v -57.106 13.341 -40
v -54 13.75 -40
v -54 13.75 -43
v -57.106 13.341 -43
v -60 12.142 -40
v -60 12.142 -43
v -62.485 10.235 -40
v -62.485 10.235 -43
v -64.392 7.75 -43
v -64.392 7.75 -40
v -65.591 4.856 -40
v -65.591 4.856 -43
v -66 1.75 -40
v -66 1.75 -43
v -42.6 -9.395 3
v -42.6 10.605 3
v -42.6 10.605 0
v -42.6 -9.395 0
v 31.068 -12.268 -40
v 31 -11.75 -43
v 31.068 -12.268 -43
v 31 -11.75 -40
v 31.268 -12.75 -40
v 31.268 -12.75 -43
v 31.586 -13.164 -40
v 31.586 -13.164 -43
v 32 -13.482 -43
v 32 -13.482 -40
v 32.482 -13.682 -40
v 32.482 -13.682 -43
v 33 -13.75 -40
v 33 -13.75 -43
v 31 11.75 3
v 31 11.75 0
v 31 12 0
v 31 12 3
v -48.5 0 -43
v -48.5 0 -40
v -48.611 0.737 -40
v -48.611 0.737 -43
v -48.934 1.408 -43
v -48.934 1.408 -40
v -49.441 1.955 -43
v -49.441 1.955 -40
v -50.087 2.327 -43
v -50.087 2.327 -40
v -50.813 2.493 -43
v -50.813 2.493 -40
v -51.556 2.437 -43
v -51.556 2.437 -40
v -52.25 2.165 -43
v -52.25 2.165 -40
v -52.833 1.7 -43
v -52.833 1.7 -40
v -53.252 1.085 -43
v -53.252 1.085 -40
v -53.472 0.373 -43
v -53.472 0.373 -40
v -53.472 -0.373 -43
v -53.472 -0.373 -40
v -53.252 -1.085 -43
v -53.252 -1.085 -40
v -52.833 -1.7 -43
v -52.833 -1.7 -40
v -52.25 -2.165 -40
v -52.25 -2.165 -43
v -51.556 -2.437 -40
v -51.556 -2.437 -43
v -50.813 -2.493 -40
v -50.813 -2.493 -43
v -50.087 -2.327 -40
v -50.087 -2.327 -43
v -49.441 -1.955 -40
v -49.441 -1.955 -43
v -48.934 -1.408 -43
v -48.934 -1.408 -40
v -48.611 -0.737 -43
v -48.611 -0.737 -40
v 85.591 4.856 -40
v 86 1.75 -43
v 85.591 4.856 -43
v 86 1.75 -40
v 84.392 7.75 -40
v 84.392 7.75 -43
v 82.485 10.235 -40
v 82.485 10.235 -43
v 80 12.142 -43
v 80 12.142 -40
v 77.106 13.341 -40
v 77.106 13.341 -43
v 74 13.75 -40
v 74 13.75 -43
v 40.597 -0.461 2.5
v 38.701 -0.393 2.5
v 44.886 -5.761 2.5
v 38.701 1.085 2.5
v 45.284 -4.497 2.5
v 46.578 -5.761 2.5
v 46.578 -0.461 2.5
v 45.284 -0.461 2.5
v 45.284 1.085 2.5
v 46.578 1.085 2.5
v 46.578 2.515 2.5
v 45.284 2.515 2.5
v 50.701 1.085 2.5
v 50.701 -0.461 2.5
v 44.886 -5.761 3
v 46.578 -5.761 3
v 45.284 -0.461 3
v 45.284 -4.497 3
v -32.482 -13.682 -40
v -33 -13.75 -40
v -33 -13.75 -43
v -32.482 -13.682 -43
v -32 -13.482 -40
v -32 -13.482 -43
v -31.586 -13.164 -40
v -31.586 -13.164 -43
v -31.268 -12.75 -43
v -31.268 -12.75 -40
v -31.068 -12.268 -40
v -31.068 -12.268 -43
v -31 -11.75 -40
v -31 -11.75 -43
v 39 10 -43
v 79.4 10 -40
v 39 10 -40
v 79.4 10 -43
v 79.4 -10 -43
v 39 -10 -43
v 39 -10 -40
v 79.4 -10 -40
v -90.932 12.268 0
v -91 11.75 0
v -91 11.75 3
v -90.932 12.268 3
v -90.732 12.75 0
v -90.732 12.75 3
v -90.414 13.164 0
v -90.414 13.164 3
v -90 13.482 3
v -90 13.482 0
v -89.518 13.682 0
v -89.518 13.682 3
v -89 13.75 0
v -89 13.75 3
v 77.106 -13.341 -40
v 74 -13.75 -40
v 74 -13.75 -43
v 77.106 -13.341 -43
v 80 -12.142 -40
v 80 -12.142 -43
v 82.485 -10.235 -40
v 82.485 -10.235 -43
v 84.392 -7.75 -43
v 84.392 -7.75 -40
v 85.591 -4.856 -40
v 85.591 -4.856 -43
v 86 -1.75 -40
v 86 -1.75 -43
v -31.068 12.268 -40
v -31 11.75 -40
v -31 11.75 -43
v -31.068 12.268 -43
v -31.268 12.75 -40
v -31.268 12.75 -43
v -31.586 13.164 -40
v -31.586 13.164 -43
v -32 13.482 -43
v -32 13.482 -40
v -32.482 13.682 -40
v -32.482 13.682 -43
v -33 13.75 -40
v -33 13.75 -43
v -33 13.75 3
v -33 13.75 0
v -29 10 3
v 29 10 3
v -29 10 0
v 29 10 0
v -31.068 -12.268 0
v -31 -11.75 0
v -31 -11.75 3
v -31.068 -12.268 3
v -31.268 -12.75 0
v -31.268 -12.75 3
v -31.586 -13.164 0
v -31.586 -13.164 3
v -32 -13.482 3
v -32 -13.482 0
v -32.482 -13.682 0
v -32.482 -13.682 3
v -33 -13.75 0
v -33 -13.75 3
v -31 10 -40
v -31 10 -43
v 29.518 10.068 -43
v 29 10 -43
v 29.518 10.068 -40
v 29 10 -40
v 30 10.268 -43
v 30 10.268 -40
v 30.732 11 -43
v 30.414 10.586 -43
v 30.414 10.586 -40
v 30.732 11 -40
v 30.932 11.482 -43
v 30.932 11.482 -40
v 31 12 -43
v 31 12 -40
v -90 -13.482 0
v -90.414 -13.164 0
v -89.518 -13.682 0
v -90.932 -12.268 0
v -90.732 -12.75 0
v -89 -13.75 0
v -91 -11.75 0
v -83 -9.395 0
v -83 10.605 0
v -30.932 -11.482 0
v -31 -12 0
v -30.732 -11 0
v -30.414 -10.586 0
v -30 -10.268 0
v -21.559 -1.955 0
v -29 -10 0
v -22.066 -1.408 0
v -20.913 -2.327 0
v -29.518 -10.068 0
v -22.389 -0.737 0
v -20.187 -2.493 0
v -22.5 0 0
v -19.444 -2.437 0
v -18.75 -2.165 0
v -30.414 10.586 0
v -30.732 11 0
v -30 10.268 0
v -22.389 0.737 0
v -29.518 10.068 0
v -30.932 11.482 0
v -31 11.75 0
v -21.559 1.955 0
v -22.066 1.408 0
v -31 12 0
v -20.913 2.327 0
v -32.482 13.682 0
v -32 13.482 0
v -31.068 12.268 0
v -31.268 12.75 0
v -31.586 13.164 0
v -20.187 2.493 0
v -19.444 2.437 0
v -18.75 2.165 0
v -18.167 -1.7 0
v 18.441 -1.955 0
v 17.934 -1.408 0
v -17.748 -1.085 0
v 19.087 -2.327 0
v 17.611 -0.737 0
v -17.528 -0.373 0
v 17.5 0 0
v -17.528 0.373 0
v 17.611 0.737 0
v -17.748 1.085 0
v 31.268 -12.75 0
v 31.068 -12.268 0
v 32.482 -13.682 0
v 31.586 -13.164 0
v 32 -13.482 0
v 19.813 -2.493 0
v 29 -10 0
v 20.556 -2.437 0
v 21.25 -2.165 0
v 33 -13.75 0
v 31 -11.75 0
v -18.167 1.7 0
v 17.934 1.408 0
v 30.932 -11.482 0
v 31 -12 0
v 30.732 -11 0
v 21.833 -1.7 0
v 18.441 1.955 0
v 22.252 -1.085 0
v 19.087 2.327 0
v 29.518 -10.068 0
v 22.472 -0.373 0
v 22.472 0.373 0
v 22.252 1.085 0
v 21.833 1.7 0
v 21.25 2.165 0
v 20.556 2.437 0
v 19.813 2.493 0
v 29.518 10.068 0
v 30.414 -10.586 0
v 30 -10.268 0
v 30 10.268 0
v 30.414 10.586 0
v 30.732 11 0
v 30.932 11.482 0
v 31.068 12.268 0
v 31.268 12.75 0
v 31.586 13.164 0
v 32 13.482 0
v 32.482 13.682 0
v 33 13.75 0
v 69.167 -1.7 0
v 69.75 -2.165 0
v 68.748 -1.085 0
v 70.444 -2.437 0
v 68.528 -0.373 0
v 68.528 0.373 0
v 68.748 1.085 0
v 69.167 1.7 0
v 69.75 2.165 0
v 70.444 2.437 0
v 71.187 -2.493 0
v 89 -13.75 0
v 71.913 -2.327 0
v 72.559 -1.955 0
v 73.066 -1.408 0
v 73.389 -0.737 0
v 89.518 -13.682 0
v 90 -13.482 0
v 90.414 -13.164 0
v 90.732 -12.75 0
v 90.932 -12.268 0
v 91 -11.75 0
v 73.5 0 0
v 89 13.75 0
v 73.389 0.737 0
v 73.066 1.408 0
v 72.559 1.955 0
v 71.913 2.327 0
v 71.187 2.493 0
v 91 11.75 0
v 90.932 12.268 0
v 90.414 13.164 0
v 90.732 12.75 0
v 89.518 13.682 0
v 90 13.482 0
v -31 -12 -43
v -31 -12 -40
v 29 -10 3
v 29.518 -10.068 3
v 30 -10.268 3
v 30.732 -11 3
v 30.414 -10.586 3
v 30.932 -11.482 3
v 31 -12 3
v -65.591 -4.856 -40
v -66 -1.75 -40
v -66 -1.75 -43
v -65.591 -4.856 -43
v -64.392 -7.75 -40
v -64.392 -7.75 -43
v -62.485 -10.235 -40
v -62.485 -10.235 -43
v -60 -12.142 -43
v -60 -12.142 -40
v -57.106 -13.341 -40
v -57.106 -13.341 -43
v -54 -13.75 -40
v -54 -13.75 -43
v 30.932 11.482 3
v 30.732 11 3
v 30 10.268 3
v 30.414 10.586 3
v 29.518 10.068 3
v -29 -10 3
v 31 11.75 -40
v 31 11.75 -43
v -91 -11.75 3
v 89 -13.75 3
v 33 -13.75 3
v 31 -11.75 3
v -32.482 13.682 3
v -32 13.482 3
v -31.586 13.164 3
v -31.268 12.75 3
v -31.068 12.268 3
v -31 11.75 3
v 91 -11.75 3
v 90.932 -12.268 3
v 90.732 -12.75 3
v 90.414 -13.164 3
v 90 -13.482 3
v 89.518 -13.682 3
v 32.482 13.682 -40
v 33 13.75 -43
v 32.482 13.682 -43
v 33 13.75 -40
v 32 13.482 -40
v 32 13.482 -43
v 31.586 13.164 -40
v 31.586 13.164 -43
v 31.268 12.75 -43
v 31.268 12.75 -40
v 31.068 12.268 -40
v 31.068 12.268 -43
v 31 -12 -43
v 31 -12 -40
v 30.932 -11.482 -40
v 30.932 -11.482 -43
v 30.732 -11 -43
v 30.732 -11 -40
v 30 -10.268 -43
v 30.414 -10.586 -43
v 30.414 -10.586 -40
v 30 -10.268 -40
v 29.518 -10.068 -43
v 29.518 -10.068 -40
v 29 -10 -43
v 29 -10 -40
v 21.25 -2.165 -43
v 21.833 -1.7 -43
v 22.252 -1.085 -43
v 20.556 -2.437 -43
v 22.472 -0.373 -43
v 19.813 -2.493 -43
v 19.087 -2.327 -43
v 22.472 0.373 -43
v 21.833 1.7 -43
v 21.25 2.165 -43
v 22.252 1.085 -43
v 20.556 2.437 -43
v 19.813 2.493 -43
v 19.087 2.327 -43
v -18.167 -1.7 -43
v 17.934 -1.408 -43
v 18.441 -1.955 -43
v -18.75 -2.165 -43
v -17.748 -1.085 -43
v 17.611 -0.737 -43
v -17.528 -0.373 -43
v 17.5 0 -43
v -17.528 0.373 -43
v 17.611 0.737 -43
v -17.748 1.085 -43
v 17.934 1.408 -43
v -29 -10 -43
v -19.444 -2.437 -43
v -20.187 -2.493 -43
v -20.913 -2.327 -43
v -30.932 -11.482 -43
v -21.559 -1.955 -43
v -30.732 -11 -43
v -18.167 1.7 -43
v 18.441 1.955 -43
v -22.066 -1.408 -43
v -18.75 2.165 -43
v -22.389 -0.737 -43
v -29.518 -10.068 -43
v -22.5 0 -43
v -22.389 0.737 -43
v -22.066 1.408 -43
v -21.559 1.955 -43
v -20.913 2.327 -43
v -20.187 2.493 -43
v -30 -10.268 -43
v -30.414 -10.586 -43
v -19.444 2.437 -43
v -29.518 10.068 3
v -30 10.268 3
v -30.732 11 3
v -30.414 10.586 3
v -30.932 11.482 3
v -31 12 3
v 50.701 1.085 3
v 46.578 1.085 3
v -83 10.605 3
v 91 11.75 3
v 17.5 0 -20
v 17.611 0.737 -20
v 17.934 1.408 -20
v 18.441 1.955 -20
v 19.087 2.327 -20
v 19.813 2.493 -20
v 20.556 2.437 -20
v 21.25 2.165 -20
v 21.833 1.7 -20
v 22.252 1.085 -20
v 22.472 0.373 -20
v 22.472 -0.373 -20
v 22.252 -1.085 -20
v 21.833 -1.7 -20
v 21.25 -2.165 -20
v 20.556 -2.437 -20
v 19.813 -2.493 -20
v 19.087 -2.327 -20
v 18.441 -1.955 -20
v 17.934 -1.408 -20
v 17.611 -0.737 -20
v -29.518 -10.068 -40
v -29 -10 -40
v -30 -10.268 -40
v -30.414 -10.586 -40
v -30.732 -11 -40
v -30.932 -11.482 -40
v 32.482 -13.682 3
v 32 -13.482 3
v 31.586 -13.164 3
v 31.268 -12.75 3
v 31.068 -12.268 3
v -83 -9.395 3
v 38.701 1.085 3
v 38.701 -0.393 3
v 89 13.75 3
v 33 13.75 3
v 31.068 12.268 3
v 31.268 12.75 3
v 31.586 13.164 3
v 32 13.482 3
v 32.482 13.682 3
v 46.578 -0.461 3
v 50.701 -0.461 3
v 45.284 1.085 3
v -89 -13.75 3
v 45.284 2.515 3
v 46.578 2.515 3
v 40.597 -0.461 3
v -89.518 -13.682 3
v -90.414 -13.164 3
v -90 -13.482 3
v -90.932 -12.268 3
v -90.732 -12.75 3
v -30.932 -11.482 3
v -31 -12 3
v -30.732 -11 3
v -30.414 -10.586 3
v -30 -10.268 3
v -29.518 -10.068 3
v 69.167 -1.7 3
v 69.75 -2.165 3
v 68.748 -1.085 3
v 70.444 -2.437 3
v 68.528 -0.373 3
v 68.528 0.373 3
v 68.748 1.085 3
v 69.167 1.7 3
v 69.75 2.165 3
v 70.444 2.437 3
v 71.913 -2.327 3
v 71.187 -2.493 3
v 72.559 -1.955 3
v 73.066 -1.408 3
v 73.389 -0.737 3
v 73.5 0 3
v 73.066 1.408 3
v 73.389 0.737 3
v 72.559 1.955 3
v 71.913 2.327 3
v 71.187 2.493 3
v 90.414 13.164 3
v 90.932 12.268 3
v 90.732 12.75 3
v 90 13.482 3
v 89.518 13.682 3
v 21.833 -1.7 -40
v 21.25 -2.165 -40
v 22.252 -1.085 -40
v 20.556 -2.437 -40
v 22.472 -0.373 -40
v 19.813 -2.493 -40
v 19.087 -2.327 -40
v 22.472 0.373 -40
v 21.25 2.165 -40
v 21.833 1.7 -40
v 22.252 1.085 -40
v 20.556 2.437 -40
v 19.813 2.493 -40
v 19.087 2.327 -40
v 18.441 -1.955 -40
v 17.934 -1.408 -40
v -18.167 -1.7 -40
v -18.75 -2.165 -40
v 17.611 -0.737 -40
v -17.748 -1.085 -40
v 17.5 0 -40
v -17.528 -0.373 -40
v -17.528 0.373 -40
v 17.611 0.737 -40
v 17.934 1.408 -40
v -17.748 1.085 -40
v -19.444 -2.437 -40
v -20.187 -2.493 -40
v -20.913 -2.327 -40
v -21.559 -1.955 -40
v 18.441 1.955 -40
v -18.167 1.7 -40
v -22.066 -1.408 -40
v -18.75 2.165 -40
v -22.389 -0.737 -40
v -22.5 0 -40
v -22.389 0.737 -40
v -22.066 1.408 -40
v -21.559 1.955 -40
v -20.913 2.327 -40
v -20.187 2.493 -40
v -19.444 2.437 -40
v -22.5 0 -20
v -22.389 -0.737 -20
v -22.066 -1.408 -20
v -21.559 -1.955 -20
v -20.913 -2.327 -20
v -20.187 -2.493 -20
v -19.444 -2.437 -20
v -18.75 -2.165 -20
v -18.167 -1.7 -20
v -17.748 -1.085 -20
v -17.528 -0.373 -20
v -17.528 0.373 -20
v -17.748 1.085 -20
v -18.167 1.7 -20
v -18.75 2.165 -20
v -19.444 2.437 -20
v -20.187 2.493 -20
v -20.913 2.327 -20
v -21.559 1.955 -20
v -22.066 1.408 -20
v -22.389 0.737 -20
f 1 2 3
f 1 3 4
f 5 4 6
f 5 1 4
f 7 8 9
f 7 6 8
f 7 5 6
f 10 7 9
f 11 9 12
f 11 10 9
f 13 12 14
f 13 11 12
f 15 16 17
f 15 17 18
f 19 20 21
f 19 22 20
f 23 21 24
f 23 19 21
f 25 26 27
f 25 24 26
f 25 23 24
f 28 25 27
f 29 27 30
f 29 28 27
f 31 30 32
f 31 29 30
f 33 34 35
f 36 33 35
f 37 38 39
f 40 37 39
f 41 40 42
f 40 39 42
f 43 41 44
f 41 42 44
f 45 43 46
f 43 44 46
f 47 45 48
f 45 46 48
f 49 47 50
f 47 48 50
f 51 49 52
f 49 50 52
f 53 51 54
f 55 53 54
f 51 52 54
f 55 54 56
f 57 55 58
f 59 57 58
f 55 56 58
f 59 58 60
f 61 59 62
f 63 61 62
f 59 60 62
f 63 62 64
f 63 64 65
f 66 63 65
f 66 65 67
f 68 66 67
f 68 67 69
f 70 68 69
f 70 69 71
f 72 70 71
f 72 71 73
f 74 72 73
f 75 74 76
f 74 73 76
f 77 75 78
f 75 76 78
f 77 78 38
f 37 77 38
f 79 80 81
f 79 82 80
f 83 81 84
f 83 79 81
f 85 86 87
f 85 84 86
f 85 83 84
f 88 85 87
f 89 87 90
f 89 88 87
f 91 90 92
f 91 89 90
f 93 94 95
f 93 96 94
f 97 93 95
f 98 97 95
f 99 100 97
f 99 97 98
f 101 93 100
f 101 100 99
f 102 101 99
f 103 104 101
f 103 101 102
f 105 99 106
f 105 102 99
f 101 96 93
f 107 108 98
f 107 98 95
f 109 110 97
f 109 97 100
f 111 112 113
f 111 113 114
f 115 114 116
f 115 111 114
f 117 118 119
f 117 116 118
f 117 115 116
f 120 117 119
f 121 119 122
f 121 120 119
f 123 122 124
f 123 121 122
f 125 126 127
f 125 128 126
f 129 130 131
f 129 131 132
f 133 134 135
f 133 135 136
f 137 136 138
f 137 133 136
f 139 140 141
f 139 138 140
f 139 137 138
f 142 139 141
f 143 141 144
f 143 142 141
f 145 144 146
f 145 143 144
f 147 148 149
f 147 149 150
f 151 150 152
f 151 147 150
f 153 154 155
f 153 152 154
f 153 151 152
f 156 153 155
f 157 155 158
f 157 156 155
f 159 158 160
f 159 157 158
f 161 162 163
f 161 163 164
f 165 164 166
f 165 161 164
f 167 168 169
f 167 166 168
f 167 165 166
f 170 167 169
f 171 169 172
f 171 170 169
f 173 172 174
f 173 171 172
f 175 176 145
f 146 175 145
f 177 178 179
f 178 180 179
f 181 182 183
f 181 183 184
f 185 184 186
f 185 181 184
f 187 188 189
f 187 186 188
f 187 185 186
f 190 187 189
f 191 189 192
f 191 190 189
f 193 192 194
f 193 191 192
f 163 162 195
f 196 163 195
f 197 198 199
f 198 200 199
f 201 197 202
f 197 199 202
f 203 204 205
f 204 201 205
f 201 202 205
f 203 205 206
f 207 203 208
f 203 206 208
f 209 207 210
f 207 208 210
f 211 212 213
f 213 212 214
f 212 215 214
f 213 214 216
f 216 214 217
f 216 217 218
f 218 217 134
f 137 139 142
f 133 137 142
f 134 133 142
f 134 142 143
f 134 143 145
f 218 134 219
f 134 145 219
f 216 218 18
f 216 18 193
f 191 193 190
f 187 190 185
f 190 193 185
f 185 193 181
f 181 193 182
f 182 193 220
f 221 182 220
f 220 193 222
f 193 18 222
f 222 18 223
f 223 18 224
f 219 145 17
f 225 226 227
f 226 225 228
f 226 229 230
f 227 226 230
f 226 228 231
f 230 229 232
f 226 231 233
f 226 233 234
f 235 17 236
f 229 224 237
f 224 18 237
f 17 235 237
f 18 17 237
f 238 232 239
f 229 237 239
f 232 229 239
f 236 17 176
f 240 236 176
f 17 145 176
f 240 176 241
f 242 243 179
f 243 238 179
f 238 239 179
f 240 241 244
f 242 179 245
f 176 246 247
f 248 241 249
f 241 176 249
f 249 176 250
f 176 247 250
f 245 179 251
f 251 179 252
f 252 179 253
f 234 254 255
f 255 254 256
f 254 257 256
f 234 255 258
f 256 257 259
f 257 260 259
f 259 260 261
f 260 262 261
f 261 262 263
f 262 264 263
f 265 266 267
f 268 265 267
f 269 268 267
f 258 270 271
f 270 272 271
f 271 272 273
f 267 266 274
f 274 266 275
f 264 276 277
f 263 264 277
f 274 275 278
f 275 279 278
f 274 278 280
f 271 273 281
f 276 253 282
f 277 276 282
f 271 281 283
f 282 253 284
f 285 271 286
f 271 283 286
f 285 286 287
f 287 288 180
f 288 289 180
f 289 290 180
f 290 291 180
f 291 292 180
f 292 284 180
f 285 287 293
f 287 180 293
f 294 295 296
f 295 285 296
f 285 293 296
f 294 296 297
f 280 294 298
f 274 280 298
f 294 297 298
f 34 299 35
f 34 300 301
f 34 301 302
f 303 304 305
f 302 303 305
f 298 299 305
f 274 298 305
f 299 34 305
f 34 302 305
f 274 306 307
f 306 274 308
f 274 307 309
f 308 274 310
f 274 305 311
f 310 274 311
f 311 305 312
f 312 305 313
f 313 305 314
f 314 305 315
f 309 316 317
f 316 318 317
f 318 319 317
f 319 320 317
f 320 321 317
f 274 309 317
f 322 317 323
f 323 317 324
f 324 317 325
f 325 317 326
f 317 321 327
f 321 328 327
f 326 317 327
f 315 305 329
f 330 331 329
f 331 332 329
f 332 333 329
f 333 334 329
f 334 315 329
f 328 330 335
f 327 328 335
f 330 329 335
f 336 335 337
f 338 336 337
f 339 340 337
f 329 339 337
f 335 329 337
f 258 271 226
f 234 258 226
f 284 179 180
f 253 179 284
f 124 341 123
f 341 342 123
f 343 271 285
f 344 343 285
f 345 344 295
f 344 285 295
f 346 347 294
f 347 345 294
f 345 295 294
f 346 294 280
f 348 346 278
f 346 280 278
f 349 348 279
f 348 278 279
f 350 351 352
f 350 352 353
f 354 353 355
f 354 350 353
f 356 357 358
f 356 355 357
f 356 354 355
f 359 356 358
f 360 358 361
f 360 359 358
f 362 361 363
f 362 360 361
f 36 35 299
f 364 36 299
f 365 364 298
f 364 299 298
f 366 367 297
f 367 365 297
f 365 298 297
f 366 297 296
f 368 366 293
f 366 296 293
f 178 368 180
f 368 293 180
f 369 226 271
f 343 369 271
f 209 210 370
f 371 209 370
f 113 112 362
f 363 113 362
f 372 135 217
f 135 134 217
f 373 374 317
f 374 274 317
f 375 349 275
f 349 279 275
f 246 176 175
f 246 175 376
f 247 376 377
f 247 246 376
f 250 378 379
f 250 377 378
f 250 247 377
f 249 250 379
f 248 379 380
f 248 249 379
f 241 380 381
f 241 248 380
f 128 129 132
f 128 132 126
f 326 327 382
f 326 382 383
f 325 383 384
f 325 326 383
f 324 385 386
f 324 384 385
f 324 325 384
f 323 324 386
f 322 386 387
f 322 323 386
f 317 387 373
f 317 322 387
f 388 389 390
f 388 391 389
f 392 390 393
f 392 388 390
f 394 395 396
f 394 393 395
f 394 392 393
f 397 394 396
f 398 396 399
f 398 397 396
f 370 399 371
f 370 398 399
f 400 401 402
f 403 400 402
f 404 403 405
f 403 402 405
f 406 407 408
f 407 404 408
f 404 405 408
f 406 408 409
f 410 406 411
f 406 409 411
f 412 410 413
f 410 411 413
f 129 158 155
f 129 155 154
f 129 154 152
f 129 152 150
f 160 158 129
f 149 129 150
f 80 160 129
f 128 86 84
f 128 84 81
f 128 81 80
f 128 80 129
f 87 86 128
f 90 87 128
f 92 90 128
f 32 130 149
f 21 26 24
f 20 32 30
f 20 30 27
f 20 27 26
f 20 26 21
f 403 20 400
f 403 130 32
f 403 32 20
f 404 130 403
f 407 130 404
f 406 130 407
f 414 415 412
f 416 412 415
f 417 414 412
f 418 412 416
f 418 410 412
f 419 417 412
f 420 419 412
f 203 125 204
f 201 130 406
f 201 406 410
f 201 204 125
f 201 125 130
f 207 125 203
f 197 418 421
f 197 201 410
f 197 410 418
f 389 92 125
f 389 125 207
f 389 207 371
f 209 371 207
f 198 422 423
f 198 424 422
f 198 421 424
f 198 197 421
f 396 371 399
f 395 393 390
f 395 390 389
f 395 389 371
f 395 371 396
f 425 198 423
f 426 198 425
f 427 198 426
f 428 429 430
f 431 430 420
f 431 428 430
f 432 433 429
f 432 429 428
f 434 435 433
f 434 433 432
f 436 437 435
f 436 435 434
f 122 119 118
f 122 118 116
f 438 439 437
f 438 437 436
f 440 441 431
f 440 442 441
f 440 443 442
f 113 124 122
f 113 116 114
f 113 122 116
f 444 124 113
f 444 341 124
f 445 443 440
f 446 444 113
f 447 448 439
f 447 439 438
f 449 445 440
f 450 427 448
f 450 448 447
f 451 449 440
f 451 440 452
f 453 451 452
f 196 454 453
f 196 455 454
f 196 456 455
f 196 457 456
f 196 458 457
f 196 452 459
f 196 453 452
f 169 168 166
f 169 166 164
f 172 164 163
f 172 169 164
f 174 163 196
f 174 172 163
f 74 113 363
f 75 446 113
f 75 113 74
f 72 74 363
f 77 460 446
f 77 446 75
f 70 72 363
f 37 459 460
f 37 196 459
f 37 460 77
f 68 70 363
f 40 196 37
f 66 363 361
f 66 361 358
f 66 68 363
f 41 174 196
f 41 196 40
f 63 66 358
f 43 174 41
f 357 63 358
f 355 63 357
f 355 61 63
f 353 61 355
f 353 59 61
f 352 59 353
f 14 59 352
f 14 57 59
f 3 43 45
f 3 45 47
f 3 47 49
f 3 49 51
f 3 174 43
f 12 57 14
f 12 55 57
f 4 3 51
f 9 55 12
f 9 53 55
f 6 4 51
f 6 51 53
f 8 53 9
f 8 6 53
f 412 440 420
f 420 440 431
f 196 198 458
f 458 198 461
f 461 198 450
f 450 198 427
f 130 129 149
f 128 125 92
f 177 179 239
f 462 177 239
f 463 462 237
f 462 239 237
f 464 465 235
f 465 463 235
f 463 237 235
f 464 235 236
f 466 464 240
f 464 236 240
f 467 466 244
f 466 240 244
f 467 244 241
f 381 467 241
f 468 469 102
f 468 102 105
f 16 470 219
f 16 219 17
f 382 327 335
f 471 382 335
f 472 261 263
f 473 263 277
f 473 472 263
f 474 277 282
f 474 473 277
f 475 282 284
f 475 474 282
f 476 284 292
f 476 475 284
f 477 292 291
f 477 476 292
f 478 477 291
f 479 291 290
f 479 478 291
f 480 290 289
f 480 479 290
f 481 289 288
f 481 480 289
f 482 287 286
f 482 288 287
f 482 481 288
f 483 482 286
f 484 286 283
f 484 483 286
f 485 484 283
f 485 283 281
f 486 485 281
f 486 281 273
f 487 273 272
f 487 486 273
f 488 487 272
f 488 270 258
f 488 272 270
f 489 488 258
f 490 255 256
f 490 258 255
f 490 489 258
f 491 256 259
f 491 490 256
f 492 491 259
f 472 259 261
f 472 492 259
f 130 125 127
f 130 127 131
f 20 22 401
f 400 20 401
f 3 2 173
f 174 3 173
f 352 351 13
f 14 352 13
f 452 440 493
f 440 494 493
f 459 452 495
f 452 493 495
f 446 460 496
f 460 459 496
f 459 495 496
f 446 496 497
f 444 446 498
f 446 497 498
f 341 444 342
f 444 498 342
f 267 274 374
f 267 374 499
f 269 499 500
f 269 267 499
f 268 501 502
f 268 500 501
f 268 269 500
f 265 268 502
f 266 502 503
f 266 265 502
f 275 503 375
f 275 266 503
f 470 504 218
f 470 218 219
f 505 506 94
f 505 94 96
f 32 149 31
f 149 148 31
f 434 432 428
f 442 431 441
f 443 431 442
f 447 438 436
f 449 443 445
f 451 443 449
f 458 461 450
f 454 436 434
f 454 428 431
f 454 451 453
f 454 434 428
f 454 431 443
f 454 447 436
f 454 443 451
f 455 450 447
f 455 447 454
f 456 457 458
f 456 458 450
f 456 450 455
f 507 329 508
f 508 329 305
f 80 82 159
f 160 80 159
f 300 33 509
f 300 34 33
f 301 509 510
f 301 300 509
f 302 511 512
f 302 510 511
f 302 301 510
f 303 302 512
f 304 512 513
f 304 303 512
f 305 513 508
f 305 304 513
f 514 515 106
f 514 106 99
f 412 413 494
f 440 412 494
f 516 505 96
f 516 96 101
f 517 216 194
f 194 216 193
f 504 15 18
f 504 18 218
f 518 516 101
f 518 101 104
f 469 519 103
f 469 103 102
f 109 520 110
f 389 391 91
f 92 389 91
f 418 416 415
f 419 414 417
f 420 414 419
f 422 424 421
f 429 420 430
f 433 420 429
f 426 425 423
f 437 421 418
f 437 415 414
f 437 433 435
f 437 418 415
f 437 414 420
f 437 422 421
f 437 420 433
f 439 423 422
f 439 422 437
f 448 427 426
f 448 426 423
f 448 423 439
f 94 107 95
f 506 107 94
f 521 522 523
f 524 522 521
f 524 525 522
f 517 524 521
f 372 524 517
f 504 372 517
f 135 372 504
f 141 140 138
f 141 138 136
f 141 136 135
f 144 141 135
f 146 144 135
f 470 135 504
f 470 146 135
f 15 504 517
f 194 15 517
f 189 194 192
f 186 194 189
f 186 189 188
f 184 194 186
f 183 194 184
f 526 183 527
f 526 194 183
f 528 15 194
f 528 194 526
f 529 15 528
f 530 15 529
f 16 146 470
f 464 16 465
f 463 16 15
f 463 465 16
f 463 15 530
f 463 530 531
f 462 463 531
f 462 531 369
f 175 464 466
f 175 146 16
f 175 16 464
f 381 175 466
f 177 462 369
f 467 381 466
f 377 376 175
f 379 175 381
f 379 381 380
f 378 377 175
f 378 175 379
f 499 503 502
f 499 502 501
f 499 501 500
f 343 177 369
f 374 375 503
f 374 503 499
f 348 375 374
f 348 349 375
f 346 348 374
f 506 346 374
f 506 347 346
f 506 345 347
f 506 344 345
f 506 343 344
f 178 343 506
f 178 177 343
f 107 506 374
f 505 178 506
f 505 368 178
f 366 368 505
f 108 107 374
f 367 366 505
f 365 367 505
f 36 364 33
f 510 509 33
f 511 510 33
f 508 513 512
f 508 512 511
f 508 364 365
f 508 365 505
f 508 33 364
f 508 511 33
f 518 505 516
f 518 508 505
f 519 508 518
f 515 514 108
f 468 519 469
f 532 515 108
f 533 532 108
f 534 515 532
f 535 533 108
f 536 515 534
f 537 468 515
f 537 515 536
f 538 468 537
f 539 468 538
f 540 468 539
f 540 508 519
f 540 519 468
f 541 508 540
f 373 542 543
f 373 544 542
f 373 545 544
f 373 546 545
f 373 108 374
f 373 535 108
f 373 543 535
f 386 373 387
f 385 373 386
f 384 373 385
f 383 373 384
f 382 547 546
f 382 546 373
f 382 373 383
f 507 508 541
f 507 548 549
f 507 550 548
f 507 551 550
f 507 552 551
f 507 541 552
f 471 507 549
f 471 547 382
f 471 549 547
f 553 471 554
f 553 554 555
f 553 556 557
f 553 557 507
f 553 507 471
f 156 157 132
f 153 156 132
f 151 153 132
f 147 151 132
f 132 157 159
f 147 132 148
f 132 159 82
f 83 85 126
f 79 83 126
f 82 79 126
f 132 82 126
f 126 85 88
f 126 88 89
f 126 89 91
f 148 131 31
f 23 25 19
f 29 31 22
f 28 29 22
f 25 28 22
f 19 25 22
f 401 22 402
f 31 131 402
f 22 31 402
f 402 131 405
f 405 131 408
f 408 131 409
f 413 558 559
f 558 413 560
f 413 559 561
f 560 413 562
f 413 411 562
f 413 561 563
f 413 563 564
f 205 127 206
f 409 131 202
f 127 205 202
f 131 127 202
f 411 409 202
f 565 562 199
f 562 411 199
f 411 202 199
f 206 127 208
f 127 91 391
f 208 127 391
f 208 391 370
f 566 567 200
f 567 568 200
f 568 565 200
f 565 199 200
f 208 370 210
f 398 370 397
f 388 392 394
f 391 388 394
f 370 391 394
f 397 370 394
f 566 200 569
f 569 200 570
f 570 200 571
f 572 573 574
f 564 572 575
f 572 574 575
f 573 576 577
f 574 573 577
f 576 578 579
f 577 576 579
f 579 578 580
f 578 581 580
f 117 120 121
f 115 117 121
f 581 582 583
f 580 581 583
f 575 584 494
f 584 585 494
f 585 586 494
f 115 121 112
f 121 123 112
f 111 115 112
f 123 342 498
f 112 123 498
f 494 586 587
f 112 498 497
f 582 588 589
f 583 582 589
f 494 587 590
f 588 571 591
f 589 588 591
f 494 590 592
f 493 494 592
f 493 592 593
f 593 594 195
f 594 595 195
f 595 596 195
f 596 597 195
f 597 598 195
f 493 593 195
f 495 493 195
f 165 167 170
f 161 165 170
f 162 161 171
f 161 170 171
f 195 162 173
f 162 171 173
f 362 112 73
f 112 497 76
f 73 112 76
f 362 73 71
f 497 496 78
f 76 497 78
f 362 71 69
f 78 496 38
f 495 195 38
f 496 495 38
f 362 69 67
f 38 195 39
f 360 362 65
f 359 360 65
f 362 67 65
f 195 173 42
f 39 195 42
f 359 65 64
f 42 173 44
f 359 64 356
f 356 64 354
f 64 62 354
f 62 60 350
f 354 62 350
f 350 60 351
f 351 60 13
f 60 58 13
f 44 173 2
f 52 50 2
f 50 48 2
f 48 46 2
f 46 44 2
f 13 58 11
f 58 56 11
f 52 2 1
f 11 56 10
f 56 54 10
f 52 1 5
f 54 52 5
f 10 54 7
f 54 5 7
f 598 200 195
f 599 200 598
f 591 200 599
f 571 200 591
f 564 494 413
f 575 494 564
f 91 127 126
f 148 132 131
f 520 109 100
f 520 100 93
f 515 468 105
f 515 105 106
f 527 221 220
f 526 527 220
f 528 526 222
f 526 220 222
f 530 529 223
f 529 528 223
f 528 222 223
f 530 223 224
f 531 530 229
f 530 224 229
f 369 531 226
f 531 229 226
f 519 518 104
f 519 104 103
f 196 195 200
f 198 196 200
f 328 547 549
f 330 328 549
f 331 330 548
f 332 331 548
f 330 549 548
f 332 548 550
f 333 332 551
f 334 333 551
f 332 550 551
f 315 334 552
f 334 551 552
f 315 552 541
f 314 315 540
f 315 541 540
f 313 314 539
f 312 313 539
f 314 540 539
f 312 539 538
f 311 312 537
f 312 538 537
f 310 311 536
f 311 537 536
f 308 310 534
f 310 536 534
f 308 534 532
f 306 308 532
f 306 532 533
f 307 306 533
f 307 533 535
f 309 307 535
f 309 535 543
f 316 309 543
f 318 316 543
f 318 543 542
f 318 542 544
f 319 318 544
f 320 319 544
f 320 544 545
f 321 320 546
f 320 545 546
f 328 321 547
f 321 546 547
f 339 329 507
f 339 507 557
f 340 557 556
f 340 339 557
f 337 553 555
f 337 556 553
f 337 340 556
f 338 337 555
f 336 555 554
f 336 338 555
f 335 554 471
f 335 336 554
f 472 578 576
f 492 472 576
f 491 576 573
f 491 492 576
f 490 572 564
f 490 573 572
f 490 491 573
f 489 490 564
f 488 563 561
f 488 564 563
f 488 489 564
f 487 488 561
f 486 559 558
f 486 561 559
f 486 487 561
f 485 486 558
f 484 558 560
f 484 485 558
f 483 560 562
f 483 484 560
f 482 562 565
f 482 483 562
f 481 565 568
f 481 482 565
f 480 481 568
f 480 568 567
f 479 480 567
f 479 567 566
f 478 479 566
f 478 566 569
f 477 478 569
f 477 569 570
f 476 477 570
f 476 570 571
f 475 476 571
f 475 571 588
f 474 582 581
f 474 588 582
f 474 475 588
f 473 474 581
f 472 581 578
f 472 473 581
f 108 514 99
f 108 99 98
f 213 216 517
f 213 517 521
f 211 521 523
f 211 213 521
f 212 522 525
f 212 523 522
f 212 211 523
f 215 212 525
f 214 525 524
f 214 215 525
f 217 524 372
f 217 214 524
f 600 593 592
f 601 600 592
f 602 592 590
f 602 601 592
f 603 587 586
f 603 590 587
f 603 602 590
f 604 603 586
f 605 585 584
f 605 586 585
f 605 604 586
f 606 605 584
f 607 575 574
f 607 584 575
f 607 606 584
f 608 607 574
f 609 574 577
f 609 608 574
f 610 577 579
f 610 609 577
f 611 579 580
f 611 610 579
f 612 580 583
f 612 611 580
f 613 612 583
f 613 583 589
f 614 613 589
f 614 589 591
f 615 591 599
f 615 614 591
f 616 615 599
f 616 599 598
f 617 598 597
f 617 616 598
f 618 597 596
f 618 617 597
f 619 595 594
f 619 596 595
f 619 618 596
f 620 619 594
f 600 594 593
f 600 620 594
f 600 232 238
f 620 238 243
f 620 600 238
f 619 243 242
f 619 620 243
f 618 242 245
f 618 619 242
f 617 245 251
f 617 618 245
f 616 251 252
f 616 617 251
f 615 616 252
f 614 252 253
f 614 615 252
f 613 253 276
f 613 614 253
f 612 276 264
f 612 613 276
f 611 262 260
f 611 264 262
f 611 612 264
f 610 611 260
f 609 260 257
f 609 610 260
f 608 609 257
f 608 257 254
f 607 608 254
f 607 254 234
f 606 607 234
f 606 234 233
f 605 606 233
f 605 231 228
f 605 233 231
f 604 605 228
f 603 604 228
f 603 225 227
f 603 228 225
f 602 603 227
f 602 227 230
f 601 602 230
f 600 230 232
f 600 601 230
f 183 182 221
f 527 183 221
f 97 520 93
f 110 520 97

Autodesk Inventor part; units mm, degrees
ref_plane "YZ Plane" through (0, 0, 0) normal (1, 0, 0) x (0, 1, 0)
sketch "Boceto1" plane through (0, 0, 0) normal (0, 0, 1) x (1, 0, 0)
  line L0 (-91, 11.75) -> (-91, -11.75)
  line L1 (-89, -13.75) -> (-33, -13.75)
  line L2 (-31, -11.75) -> (-31, -12)
  line L3 (-29, -10) -> (29, -10)
  line L4 (31, -12) -> (31, -11.75)
  line L5 (33, -13.75) -> (89, -13.75)
  line L6 (91, -11.75) -> (91, 11.75)
  line L7 (89, 13.75) -> (33, 13.75)
  line L8 (31, 11.75) -> (31, 12)
  line L9 (29, 10) -> (-29, 10)
  line L10 (-31, 12) -> (-31, 11.75)
  line L11 (-33, 13.75) -> (-89, 13.75)
  line L12 (0, 0) -> (0, 52.9432) construction
  line L13 (0, 0) -> (-66, 0) construction
  arc A0 (-89, 13.75) -> (-91, 11.75) centre (-89, 11.75) ccw
  arc A1 (-91, -11.75) -> (-89, -13.75) centre (-89, -11.75) ccw
  arc A2 (-33, -13.75) -> (-31, -11.75) centre (-33, -11.75) ccw
  arc A3 (-29, -10) -> (-31, -12) centre (-29, -12) ccw
  arc A4 (-31, 12) -> (-29, 10) centre (-29, 12) ccw
  arc A5 (-31, 11.75) -> (-33, 13.75) centre (-33, 11.75) ccw
  arc A6 (29, 10) -> (31, 12) centre (29, 12) ccw
  arc A7 (33, 13.75) -> (31, 11.75) centre (33, 11.75) ccw
  arc A8 (31, -12) -> (29, -10) centre (29, -12) ccw
  arc A9 (31, -11.75) -> (33, -13.75) centre (33, -11.75) ccw
  arc A10 (89, -13.75) -> (91, -11.75) centre (89, -11.75) ccw
  arc A11 (91, 11.75) -> (89, 13.75) centre (89, 11.75) ccw
  point P0 (-91, 13.75)
  point P1 (-91, -13.75)
  point P2 (-31, -13.75)
  point P3 (91, -13.75)
  point P4 (91, 13.75)
  point P5 (31, 13.75)
  point P6 (31, 10)
  point P7 (-31, 10)
  point P8 (-31, 13.75)
  dimension "d0" = 182
  dimension "d1" = 60
  dimension "d3" = 27.5
  dimension "d4" = 20
  dimension "d5" = 2
  dimension "d6" = 27.5
  dimension "d7" = 2
extrude "Extrusión1" add sketch "Boceto1" along normal blind 3
sketch "Boceto2" plane through (0, 0, 3) normal (0, 0, 1) x (1, 0, 0)
  circle A0 centre (-20, 0) radius 2.5
  circle A1 centre (20, 0) radius 2.5
  line L0 (0, 0) -> (0, 32) construction
  dimension "d10" = 5
  dimension "d11" = 5
  dimension "d12" = 40
extrude "Extrusión2" cut sketch "Boceto2" against normal blind 3
ref_plane "Plano de trabajo1" through (0, 0, -40) normal (0, 0, -1) x (-1, 0, 0)
sketch "Boceto3" plane through (0, 0, -40) normal (0, 0, -1) x (-1, 0, 0)
  line L0 (-86, 1.75) -> (-86, -1.75)
  line L1 (-74, -13.75) -> (-33, -13.75)
  line L2 (-31, -11.75) -> (-31, -12)
  line L3 (-29, -10) -> (29, -10)
  line L4 (31, -12) -> (31, -11.75)
  line L5 (33, -13.75) -> (54, -13.75)
  line L6 (66, -1.75) -> (66, 1.75)
  line L7 (54, 13.75) -> (33, 13.75)
  line L8 (31, 11.75) -> (31, 10)
  line L9 (31, 10) -> (-29, 10)
  line L10 (-31, 12) -> (-31, 11.75)
  line L11 (-33, 13.75) -> (-74, 13.75)
  line L12 (0, 0) -> (0, 26) construction
  line L13 (0, 0) -> (49, 0) construction
  arc A0 (-74, 13.75) -> (-86, 1.75) centre (-74, 1.75) ccw
  arc A1 (-86, -1.75) -> (-74, -13.75) centre (-74, -1.75) ccw
  arc A2 (66, 1.75) -> (54, 13.75) centre (54, 1.75) ccw
  arc A3 (54, -13.75) -> (66, -1.75) centre (54, -1.75) ccw
  arc A4 (-31, 11.75) -> (-33, 13.75) centre (-33, 11.75) ccw
  arc A5 (-31, 12) -> (-29, 10) centre (-29, 12) ccw
  arc A6 (-29, -10) -> (-31, -12) centre (-29, -12) ccw
  arc A7 (-33, -13.75) -> (-31, -11.75) centre (-33, -11.75) ccw
  arc A8 (33, 13.75) -> (31, 11.75) centre (33, 11.75) ccw
  arc A9 (31, -11.75) -> (33, -13.75) centre (33, -11.75) ccw
  arc A10 (31, -12) -> (29, -10) centre (29, -12) ccw
  point P0 (-86, 13.75)
  point P1 (-86, -13.75)
  point P2 (66, -13.75)
  point P3 (66, 13.75)
  point P4 (31, 13.75)
  point P5 (-31, 10)
  point P6 (-31, 13.75)
  dimension "d16" = 27.5
  dimension "d17" = 27.5
  dimension "d18" = 152
  dimension "d19" = 55
  dimension "d21" = 62
  dimension "d22" = 20
  dimension "d23" = 12
  dimension "d24" = 2
extrude "Extrusión3" add sketch "Boceto3" along normal blind 3
sketch "Boceto4" plane through (0, 0, -43) normal (0, 0, -1) x (-1, 0, 0)
  circle A0 centre (-20, 0) radius 2.5 projected
  circle A1 centre (20, 0) radius 2.5 projected
  point P0 (0, 0)
extrude "Extrusión4" cut sketch "Boceto4" against normal blind 3
sketch "Boceto5" plane through (0, 0, 3) normal (0, 0, 1) x (1, 0, 0)
  line L0 (-51, 21) -> (-51, -25) construction
  line L1 (71, 20) -> (71, -24) construction
  line L2 (31, -12) -> (31, -11.75) projected
  circle A0 centre (-51, 0) radius 2.5
  circle A1 centre (71, 0) radius 2.5
  line L3 (-91, 11.75) -> (-91, -11.75) projected
  point P0 (31, -11.875)
  dimension "d32" = 40
  dimension "d34" = 5
  dimension "d35" = 5
  dimension "d46" = 40
extrude "Extrusión5" cut sketch "Boceto5" against normal up to surface (46 mm away)
sketch "Boceto6" plane through (0, 0, -43) normal (0, 0, -1) x (-1, 0, 0)
  circle A0 centre (51, 0) radius 2.5
  line L0 (31, 11.75) -> (31, 10) projected
  point P0 (0, 0)
  point P1 (31, 10.875)
  dimension "d38" = 5
  dimension "d39" = 20
extrude "Extrusión6" cut sketch "Boceto6" against normal blind 3
ref_plane "Plano de trabajo2" through (0, 0, -20) normal (0, 0, -1) x (-1, 0, 0)
sketch "Boceto7" plane through (0, 0, -20) normal (0, 0, -1) x (-1, 0, 0)
  circle A0 centre (20, 0) radius 2.5 projected
  circle A1 centre (-20, 0) radius 2.5 projected
  point P0 (0, 0)
extrude "Extrusión7" add sketch "Boceto7" along normal mid plane 46
sketch "Boceto8" plane through (0, 0, 3) normal (0, 0, 1) x (1, 0, 0)
  line L0 (38.7008, -6.0818) -> (38.7008, 17.3731) construction
  line L1 (38.7008, 17.3731) -> (57.2312, 17.3731) construction
  line L2 (57.2312, 17.3731) -> (57.2312, -6.0818) construction
  line L3 (57.2312, -6.0818) -> (38.7008, -6.0818) construction
  line L4 (46.5776, 2.5146) -> (46.5776, 1.0851)
  line L5 (46.5776, 1.0851) -> (50.7008, 1.0851)
  line L6 (50.7008, 1.0851) -> (50.7008, -0.461)
  line L7 (50.7008, -0.461) -> (46.5776, -0.461)
  line L8 (46.5776, -0.461) -> (46.5776, -5.7609)
  line L9 (46.5776, -5.7609) -> (44.8855, -5.7609)
  line L10 (44.8855, -5.7609) -> (38.7008, -0.393)
  line L11 (38.7008, -0.393) -> (38.7008, 1.0851)
  line L12 (38.7008, 1.0851) -> (45.2842, 1.0851)
  line L13 (45.2842, 1.0851) -> (45.2842, 2.5146)
  line L14 (45.2842, 2.5146) -> (46.5776, 2.5146)
  line L15 (45.2842, -0.461) -> (40.597, -0.461)
  line L16 (40.597, -0.461) -> (45.2842, -4.4967)
  line L17 (45.2842, -4.4967) -> (45.2842, -0.461)
  point P0 (0, 0)
extrude "Extrusión8" cut sketch "Boceto8" against normal blind 0.5
sketch "Boceto9" plane through (0, 0, 3) normal (0, 0, 1) x (1, 0, 0)
  line L0 (-83, 10.6047) -> (-42.6, 10.6047)
  line L1 (-42.6, 10.6047) -> (-42.6, -9.3953)
  line L2 (-42.6, -9.3953) -> (-83, -9.3953)
  line L3 (-83, -9.3953) -> (-83, 10.6047)
  line L4 (-91, 11.75) -> (-91, -11.75) construction
  point P0 (0, 0)
  dimension "d47" = 40.4
  dimension "d48" = 20
  dimension "d49" = 8
extrude "Extrusión9" cut sketch "Boceto9" against normal up to surface (3 mm away)
sketch "Boceto10" plane through (0, 0, -43) normal (0, 0, -1) x (-1, 0, 0)
  line L0 (-79.4, 10) -> (-39, 10)
  line L1 (-39, 10) -> (-39, -10)
  line L2 (-39, -10) -> (-79.4, -10)
  line L3 (-79.4, -10) -> (-79.4, 10)
  line L4 (-71, 0) -> (-43, 0) construction
  line L5 (-31, 12) -> (-31, 11.75) projected
  point P0 (0, 0)
  point P1 (-31, 11.875)
  dimension "d52" = 40.4
  dimension "d53" = 20
  dimension "d54" = 8
extrude "Extrusión10" cut sketch "Boceto10" against normal blind 3
equation "\"Radio_pliegue\" = Grosor"
equation "\"Anchura_desahogo_plegado\" = Grosor"
equation "\"Profundidad_desahogo_plegado\" = 0.5 * Grosor"
equation "\"Tamaño_destalonado\" = 4 * Grosor"
equation "\"Remanente_mínimo\" = 2 * Grosor"
equation "\"Radiodetransición\" = Radio_pliegue"
equation "\"Tamaño_de_radio_de_Jacobi\" = Radio_pliegue"
equation "\"TamañoSeparación\" = Grosor"
equation "\"Grosor\" = 0.5"
properties part number "Pieza_eslabon_4"
